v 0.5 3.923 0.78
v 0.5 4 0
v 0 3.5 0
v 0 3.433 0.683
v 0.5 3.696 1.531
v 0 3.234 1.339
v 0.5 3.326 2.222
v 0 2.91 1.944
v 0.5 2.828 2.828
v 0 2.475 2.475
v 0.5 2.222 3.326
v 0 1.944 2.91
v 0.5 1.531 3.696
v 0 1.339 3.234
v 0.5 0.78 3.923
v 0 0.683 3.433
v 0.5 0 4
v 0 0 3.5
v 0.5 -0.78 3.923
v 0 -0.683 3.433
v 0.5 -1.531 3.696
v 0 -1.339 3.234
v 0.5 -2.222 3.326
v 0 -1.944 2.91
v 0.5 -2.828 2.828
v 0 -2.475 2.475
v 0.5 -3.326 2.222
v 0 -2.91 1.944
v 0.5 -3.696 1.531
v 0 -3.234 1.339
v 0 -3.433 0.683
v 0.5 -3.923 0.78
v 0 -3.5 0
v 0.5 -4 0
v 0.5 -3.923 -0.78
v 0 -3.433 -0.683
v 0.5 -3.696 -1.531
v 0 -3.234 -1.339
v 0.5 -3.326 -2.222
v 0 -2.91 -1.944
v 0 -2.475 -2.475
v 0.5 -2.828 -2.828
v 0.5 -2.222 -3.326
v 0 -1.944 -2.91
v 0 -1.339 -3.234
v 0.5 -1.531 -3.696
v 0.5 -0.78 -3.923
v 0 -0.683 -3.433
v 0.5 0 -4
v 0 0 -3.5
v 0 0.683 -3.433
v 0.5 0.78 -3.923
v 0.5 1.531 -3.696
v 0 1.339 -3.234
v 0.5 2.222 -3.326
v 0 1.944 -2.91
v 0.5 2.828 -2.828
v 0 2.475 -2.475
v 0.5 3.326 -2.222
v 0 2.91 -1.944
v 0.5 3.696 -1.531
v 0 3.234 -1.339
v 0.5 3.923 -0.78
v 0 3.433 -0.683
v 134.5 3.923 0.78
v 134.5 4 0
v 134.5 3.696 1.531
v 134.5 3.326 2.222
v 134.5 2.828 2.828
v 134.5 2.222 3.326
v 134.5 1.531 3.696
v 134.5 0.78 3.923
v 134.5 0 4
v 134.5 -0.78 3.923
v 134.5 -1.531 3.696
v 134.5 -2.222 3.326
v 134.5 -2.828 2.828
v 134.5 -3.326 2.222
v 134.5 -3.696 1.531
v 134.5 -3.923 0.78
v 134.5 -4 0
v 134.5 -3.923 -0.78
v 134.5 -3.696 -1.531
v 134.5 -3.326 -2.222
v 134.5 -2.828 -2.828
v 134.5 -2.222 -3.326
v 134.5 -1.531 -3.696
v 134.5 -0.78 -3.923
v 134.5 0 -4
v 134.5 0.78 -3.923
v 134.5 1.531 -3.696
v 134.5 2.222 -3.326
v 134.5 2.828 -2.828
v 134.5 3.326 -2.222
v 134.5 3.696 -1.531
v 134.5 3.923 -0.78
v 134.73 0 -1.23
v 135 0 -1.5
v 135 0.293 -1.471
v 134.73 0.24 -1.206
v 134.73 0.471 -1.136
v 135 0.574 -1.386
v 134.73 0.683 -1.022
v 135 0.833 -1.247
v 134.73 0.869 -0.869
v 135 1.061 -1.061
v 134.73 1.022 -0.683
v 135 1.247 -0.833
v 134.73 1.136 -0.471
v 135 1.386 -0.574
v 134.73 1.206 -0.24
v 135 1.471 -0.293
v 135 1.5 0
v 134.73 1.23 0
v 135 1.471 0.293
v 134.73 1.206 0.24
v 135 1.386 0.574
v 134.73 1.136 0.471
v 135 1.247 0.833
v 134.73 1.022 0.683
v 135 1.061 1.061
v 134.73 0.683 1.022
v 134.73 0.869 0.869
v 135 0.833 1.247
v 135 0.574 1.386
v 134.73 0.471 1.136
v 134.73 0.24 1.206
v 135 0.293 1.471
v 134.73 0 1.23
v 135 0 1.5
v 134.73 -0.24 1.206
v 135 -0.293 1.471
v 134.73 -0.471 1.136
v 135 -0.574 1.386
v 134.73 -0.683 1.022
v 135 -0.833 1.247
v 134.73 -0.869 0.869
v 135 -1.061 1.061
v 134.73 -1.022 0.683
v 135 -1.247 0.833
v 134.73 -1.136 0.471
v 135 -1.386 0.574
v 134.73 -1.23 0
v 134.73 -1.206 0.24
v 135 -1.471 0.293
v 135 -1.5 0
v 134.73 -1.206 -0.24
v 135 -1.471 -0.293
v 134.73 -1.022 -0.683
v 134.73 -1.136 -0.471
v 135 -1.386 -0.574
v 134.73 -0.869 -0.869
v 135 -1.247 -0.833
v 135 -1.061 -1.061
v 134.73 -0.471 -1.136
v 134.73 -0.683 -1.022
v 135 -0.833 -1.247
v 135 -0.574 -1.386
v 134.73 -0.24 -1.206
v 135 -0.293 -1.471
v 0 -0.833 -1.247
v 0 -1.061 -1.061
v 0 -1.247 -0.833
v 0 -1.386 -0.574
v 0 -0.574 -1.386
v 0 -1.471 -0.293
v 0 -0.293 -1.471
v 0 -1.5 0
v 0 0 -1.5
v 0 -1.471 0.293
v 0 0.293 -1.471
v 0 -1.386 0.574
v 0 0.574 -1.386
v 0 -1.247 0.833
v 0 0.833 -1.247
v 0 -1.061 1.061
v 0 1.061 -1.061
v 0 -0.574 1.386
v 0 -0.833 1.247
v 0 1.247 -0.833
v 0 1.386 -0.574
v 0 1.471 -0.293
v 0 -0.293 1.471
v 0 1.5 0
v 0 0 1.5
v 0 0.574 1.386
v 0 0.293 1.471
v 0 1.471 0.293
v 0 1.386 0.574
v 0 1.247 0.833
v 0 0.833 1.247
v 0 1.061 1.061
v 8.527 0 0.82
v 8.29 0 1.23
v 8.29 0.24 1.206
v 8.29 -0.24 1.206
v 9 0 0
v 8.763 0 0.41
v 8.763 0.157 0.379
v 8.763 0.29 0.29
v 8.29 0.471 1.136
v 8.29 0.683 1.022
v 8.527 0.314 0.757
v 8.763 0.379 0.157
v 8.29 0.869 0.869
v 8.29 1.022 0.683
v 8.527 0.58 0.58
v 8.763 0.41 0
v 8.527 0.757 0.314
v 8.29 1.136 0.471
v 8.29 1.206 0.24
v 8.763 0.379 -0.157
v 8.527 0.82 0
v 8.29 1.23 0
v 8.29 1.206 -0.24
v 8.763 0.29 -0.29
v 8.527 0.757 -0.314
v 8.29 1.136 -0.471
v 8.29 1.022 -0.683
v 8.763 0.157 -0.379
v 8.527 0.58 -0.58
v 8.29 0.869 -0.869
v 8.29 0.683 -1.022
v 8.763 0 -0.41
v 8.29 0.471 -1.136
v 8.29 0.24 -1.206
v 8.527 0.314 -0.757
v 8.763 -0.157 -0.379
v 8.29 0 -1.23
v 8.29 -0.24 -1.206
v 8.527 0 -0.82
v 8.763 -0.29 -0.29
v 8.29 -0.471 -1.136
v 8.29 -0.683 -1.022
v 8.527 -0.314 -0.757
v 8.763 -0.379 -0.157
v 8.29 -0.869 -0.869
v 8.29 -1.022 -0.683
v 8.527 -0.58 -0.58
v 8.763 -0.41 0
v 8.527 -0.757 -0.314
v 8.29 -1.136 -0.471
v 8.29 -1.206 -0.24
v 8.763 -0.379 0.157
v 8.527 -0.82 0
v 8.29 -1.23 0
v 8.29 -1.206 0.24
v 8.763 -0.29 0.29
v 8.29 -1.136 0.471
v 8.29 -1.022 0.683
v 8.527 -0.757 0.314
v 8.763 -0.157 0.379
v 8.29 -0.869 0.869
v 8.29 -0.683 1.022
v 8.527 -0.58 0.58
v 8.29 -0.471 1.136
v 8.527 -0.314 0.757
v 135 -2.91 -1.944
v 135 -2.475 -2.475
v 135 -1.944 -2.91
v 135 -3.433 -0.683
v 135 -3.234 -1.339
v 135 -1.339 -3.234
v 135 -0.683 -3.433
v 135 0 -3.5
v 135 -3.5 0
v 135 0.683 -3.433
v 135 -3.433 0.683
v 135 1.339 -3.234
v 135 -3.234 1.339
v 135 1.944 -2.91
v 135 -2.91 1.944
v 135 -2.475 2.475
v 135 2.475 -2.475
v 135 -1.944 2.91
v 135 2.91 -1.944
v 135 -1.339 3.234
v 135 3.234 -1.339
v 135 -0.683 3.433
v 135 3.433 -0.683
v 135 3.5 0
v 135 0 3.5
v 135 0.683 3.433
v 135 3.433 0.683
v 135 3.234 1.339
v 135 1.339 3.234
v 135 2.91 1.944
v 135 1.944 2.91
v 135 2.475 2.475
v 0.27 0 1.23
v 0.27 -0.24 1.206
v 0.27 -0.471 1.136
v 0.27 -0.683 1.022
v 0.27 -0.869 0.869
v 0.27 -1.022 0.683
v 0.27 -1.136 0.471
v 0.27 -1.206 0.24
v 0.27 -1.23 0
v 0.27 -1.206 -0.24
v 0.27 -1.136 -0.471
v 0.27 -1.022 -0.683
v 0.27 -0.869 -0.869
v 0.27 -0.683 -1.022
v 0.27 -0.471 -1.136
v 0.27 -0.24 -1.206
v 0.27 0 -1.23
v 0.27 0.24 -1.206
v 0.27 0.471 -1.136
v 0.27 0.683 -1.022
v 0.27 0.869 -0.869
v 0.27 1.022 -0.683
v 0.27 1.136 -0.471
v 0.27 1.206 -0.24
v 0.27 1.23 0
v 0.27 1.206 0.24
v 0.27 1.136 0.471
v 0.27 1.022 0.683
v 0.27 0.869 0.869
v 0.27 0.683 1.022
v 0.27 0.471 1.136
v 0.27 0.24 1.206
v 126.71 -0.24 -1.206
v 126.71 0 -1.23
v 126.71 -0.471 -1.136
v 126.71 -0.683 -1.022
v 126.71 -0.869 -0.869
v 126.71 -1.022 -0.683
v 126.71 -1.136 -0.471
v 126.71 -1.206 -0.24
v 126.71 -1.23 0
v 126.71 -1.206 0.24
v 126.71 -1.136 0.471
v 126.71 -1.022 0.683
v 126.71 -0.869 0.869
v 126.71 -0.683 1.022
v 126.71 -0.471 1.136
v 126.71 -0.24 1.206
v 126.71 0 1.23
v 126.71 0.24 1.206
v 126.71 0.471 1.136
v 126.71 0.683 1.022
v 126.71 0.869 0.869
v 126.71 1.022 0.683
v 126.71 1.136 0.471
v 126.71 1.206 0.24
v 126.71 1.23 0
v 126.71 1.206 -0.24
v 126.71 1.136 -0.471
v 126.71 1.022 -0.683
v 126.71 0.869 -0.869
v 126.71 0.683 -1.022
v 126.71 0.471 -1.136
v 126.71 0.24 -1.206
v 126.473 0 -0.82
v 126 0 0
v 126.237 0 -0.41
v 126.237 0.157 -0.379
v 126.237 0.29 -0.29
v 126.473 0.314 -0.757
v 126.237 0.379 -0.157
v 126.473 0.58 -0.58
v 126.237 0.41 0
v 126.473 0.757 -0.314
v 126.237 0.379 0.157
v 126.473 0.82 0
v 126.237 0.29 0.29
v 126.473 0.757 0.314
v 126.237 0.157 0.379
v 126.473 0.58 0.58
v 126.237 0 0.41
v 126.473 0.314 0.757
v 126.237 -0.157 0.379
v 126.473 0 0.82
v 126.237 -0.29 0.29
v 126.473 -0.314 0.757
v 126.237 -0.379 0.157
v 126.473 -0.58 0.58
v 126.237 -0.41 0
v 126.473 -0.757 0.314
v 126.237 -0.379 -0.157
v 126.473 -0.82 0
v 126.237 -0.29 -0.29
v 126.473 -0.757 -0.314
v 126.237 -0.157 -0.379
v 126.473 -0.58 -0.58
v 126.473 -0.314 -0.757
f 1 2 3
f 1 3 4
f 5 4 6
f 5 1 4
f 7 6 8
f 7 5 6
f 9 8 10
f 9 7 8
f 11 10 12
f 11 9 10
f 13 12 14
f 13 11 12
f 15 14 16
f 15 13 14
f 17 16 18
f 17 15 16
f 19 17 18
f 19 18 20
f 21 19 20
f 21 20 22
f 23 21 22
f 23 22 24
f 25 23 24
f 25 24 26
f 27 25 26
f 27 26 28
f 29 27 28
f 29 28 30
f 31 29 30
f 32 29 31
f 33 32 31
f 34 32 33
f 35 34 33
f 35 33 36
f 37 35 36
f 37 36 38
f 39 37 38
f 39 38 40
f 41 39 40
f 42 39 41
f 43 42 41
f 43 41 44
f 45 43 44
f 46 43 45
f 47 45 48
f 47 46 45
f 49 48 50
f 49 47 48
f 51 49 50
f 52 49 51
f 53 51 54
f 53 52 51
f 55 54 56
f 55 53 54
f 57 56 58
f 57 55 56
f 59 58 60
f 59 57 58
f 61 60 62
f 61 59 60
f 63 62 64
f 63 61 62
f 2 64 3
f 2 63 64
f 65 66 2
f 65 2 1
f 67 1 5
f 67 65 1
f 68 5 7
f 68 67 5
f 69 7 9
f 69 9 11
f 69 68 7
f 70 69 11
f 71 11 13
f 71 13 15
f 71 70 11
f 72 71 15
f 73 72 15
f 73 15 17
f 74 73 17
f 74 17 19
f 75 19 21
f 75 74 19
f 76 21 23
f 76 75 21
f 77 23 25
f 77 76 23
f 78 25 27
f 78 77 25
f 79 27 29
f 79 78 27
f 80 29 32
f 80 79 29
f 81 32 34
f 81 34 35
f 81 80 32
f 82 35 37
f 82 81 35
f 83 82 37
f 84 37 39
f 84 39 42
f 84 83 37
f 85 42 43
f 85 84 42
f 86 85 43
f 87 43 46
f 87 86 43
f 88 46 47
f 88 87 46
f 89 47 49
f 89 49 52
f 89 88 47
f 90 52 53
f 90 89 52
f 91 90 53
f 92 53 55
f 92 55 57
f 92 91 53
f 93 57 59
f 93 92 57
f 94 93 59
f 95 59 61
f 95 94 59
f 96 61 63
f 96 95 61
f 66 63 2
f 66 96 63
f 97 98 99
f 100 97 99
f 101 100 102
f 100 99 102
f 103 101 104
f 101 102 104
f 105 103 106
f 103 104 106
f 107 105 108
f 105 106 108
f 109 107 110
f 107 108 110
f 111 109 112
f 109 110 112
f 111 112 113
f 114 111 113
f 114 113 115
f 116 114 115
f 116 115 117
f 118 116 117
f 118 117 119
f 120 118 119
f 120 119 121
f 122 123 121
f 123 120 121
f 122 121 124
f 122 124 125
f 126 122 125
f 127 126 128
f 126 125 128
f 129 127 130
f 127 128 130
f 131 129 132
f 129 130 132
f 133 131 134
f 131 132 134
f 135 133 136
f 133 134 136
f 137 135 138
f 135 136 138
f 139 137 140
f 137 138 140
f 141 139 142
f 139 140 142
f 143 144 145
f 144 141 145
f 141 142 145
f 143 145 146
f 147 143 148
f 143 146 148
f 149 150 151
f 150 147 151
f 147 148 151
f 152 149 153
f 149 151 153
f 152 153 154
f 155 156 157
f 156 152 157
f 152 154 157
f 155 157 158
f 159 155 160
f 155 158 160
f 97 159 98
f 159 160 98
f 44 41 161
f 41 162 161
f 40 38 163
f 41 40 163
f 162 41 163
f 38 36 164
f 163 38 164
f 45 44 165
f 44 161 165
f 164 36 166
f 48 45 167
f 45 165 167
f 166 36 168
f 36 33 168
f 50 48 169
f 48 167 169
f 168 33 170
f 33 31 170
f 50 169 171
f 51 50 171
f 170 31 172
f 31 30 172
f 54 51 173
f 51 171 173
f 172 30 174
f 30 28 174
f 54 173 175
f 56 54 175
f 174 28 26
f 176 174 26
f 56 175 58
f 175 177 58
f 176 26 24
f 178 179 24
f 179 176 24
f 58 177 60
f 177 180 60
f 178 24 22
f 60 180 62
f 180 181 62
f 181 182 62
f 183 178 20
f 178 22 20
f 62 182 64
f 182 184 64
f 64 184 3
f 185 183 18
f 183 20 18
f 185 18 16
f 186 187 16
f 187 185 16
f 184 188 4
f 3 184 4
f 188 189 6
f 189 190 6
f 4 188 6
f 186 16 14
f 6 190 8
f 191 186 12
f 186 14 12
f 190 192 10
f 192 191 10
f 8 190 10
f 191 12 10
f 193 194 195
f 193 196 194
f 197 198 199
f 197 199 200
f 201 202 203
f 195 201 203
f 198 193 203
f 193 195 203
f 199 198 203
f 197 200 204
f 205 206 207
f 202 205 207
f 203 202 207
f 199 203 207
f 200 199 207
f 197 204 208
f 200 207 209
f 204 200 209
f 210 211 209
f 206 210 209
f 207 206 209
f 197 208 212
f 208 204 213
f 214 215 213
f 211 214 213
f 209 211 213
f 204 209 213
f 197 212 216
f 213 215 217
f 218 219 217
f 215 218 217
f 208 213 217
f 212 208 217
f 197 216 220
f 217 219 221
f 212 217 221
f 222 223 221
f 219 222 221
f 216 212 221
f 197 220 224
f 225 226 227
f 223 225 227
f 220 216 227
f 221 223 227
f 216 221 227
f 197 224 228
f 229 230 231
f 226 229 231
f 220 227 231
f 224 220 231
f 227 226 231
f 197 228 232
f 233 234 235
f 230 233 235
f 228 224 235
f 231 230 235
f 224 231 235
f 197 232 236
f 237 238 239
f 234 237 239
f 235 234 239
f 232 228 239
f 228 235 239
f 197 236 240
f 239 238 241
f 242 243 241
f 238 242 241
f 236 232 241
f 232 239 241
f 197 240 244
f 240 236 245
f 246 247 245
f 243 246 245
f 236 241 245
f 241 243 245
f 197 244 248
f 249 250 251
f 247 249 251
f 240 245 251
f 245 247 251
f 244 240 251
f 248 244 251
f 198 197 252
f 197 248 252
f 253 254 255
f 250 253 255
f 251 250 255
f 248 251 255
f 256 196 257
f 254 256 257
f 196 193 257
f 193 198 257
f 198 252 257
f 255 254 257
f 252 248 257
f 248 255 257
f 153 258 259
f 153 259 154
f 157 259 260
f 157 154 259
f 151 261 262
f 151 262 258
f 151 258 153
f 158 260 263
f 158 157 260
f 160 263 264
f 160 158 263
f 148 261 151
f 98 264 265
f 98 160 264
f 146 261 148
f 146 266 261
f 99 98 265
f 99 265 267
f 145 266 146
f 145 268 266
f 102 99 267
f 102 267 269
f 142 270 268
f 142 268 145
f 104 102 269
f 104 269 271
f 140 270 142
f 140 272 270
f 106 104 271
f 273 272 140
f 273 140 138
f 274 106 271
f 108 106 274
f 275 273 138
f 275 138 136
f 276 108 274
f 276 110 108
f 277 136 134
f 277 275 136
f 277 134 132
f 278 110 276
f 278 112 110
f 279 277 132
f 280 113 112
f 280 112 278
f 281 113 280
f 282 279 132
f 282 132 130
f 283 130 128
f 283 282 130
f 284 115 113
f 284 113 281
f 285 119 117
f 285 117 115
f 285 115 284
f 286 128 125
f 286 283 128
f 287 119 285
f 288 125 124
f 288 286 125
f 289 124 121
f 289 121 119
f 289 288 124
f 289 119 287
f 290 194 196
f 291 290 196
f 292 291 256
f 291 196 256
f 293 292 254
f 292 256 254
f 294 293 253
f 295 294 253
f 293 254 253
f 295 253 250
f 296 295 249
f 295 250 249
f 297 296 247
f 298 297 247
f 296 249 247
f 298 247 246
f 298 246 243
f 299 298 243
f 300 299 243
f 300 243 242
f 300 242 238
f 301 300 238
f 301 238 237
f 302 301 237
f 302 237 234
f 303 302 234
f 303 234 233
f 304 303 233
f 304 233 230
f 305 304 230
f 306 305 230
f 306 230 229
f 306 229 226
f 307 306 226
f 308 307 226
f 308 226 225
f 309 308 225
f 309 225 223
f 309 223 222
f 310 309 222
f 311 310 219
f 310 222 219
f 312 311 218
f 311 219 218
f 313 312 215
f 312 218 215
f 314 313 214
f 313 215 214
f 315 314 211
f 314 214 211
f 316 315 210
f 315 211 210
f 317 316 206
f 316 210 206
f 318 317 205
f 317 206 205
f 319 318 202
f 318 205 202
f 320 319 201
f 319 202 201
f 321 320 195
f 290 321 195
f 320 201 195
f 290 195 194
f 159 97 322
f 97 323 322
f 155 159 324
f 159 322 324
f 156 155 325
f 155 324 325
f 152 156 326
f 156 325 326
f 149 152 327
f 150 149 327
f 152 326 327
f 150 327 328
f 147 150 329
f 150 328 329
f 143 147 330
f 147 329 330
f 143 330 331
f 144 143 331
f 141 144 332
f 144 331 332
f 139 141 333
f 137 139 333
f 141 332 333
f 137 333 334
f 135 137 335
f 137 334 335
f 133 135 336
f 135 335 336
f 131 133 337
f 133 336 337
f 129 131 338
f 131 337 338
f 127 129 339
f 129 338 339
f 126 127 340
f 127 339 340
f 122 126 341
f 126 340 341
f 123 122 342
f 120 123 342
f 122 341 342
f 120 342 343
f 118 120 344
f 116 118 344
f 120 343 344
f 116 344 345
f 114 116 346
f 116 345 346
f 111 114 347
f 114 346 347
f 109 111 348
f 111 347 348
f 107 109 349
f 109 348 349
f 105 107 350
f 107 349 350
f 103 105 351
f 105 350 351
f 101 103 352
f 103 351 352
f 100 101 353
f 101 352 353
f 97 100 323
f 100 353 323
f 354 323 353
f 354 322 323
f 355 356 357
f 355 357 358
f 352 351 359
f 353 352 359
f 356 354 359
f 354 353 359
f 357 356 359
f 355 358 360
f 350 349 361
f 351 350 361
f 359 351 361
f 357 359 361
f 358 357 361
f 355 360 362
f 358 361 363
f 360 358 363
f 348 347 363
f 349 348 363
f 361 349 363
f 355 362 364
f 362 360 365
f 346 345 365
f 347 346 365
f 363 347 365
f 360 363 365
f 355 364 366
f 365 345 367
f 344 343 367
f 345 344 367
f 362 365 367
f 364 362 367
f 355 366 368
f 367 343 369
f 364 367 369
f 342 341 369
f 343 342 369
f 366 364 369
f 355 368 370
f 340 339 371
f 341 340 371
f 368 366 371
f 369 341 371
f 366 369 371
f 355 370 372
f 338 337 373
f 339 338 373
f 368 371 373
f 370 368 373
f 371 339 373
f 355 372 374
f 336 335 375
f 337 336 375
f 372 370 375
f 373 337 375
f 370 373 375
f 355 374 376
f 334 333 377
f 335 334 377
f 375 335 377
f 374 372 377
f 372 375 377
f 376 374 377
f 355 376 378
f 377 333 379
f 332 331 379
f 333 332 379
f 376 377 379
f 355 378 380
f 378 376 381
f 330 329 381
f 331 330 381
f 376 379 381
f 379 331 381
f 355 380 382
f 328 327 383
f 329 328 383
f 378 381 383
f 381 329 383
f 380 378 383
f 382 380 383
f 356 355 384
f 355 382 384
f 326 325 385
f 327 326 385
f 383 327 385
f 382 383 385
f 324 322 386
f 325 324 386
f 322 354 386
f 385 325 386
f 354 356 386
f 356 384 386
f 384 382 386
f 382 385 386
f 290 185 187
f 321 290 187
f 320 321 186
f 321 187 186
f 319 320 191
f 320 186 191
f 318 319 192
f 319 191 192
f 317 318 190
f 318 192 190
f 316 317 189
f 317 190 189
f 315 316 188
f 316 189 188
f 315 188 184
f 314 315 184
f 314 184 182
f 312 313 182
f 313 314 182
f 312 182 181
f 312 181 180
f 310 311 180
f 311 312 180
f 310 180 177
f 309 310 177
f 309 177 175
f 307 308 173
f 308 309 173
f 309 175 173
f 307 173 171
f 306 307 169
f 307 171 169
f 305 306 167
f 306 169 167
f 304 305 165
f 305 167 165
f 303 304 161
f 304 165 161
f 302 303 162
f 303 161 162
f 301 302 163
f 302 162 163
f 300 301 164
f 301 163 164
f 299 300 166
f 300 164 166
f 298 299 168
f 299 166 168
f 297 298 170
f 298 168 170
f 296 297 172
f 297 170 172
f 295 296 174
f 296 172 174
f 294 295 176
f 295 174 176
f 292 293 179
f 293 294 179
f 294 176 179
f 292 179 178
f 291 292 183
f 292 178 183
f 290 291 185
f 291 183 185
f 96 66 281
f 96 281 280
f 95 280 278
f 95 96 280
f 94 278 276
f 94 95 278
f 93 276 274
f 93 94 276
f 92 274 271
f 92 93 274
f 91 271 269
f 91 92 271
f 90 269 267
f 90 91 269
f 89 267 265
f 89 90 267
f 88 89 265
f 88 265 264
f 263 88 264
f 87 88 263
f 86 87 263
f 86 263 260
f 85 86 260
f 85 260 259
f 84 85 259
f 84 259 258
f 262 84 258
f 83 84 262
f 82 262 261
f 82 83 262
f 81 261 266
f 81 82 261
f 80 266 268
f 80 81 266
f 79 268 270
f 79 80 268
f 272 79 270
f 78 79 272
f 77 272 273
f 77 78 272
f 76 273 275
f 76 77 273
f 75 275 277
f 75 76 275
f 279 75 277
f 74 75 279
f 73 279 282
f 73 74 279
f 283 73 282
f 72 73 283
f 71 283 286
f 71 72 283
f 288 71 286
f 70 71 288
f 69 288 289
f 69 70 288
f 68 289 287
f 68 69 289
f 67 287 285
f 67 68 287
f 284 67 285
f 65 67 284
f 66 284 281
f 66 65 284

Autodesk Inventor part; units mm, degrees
ref_plane "YZ Plane" through (0, 0, 0) normal (1, 0, 0) x (0, 1, 0)
ref_plane "XZ Plane" through (0, 0, 0) normal (0, 1, 0) x (-1, 0, 0)
ref_plane "XY Plane" through (0, 0, 0) normal (0, 0, 1) x (1, 0, 0)
sketch "Sketch_1" plane through (0, 0, 0) normal (0, 0, 1) x (1, 0, 0)
  line L0 (135, 0) -> (0, 0)
  line L1 (0, 0) -> (0, 3.5)
  line L2 (0, 3.5) -> (0.5, 4)
  line L3 (0.5, 4) -> (134.5, 4)
  line L4 (134.5, 4) -> (135, 3.5)
  line L5 (135, 3.5) -> (135, 0)
  line L6 (135, 0) -> (0, 0)
revolve "Revolution1" add sketch "Sketch_1" angle 360 about axis through (135, 0, 0) along (1, 0, 0)
sketch "Sketch2" plane through (0, 0, 0) normal (-1, 0, 0) x (0, 0, 1)
  point P0 (0, 0)
hole "Hole1" at (0, 0, 0) direction (1, 0, 0) diameter 2.459 depth 8.2901 tip angle 120 countersink diameter 3 countersink angle 90 thread size "M3x0.5" class "6H" standard "ISO Metric profile"
sketch "Sketch3" plane through (135, 0, 0) normal (1, 0, 0) x (0, 0, -1)
  point P0 (0, 0)
hole "Hole2" at (135, 0, 0) direction (-1, 0, 0) diameter 2.459 depth 8.2901 tip angle 120 countersink diameter 3 countersink angle 90 thread size "M3x0.5" class "6H" standard "ISO Metric profile"
properties part number "AETTF8-135-M3-N3" material "アルミニウム 2014-T4"
